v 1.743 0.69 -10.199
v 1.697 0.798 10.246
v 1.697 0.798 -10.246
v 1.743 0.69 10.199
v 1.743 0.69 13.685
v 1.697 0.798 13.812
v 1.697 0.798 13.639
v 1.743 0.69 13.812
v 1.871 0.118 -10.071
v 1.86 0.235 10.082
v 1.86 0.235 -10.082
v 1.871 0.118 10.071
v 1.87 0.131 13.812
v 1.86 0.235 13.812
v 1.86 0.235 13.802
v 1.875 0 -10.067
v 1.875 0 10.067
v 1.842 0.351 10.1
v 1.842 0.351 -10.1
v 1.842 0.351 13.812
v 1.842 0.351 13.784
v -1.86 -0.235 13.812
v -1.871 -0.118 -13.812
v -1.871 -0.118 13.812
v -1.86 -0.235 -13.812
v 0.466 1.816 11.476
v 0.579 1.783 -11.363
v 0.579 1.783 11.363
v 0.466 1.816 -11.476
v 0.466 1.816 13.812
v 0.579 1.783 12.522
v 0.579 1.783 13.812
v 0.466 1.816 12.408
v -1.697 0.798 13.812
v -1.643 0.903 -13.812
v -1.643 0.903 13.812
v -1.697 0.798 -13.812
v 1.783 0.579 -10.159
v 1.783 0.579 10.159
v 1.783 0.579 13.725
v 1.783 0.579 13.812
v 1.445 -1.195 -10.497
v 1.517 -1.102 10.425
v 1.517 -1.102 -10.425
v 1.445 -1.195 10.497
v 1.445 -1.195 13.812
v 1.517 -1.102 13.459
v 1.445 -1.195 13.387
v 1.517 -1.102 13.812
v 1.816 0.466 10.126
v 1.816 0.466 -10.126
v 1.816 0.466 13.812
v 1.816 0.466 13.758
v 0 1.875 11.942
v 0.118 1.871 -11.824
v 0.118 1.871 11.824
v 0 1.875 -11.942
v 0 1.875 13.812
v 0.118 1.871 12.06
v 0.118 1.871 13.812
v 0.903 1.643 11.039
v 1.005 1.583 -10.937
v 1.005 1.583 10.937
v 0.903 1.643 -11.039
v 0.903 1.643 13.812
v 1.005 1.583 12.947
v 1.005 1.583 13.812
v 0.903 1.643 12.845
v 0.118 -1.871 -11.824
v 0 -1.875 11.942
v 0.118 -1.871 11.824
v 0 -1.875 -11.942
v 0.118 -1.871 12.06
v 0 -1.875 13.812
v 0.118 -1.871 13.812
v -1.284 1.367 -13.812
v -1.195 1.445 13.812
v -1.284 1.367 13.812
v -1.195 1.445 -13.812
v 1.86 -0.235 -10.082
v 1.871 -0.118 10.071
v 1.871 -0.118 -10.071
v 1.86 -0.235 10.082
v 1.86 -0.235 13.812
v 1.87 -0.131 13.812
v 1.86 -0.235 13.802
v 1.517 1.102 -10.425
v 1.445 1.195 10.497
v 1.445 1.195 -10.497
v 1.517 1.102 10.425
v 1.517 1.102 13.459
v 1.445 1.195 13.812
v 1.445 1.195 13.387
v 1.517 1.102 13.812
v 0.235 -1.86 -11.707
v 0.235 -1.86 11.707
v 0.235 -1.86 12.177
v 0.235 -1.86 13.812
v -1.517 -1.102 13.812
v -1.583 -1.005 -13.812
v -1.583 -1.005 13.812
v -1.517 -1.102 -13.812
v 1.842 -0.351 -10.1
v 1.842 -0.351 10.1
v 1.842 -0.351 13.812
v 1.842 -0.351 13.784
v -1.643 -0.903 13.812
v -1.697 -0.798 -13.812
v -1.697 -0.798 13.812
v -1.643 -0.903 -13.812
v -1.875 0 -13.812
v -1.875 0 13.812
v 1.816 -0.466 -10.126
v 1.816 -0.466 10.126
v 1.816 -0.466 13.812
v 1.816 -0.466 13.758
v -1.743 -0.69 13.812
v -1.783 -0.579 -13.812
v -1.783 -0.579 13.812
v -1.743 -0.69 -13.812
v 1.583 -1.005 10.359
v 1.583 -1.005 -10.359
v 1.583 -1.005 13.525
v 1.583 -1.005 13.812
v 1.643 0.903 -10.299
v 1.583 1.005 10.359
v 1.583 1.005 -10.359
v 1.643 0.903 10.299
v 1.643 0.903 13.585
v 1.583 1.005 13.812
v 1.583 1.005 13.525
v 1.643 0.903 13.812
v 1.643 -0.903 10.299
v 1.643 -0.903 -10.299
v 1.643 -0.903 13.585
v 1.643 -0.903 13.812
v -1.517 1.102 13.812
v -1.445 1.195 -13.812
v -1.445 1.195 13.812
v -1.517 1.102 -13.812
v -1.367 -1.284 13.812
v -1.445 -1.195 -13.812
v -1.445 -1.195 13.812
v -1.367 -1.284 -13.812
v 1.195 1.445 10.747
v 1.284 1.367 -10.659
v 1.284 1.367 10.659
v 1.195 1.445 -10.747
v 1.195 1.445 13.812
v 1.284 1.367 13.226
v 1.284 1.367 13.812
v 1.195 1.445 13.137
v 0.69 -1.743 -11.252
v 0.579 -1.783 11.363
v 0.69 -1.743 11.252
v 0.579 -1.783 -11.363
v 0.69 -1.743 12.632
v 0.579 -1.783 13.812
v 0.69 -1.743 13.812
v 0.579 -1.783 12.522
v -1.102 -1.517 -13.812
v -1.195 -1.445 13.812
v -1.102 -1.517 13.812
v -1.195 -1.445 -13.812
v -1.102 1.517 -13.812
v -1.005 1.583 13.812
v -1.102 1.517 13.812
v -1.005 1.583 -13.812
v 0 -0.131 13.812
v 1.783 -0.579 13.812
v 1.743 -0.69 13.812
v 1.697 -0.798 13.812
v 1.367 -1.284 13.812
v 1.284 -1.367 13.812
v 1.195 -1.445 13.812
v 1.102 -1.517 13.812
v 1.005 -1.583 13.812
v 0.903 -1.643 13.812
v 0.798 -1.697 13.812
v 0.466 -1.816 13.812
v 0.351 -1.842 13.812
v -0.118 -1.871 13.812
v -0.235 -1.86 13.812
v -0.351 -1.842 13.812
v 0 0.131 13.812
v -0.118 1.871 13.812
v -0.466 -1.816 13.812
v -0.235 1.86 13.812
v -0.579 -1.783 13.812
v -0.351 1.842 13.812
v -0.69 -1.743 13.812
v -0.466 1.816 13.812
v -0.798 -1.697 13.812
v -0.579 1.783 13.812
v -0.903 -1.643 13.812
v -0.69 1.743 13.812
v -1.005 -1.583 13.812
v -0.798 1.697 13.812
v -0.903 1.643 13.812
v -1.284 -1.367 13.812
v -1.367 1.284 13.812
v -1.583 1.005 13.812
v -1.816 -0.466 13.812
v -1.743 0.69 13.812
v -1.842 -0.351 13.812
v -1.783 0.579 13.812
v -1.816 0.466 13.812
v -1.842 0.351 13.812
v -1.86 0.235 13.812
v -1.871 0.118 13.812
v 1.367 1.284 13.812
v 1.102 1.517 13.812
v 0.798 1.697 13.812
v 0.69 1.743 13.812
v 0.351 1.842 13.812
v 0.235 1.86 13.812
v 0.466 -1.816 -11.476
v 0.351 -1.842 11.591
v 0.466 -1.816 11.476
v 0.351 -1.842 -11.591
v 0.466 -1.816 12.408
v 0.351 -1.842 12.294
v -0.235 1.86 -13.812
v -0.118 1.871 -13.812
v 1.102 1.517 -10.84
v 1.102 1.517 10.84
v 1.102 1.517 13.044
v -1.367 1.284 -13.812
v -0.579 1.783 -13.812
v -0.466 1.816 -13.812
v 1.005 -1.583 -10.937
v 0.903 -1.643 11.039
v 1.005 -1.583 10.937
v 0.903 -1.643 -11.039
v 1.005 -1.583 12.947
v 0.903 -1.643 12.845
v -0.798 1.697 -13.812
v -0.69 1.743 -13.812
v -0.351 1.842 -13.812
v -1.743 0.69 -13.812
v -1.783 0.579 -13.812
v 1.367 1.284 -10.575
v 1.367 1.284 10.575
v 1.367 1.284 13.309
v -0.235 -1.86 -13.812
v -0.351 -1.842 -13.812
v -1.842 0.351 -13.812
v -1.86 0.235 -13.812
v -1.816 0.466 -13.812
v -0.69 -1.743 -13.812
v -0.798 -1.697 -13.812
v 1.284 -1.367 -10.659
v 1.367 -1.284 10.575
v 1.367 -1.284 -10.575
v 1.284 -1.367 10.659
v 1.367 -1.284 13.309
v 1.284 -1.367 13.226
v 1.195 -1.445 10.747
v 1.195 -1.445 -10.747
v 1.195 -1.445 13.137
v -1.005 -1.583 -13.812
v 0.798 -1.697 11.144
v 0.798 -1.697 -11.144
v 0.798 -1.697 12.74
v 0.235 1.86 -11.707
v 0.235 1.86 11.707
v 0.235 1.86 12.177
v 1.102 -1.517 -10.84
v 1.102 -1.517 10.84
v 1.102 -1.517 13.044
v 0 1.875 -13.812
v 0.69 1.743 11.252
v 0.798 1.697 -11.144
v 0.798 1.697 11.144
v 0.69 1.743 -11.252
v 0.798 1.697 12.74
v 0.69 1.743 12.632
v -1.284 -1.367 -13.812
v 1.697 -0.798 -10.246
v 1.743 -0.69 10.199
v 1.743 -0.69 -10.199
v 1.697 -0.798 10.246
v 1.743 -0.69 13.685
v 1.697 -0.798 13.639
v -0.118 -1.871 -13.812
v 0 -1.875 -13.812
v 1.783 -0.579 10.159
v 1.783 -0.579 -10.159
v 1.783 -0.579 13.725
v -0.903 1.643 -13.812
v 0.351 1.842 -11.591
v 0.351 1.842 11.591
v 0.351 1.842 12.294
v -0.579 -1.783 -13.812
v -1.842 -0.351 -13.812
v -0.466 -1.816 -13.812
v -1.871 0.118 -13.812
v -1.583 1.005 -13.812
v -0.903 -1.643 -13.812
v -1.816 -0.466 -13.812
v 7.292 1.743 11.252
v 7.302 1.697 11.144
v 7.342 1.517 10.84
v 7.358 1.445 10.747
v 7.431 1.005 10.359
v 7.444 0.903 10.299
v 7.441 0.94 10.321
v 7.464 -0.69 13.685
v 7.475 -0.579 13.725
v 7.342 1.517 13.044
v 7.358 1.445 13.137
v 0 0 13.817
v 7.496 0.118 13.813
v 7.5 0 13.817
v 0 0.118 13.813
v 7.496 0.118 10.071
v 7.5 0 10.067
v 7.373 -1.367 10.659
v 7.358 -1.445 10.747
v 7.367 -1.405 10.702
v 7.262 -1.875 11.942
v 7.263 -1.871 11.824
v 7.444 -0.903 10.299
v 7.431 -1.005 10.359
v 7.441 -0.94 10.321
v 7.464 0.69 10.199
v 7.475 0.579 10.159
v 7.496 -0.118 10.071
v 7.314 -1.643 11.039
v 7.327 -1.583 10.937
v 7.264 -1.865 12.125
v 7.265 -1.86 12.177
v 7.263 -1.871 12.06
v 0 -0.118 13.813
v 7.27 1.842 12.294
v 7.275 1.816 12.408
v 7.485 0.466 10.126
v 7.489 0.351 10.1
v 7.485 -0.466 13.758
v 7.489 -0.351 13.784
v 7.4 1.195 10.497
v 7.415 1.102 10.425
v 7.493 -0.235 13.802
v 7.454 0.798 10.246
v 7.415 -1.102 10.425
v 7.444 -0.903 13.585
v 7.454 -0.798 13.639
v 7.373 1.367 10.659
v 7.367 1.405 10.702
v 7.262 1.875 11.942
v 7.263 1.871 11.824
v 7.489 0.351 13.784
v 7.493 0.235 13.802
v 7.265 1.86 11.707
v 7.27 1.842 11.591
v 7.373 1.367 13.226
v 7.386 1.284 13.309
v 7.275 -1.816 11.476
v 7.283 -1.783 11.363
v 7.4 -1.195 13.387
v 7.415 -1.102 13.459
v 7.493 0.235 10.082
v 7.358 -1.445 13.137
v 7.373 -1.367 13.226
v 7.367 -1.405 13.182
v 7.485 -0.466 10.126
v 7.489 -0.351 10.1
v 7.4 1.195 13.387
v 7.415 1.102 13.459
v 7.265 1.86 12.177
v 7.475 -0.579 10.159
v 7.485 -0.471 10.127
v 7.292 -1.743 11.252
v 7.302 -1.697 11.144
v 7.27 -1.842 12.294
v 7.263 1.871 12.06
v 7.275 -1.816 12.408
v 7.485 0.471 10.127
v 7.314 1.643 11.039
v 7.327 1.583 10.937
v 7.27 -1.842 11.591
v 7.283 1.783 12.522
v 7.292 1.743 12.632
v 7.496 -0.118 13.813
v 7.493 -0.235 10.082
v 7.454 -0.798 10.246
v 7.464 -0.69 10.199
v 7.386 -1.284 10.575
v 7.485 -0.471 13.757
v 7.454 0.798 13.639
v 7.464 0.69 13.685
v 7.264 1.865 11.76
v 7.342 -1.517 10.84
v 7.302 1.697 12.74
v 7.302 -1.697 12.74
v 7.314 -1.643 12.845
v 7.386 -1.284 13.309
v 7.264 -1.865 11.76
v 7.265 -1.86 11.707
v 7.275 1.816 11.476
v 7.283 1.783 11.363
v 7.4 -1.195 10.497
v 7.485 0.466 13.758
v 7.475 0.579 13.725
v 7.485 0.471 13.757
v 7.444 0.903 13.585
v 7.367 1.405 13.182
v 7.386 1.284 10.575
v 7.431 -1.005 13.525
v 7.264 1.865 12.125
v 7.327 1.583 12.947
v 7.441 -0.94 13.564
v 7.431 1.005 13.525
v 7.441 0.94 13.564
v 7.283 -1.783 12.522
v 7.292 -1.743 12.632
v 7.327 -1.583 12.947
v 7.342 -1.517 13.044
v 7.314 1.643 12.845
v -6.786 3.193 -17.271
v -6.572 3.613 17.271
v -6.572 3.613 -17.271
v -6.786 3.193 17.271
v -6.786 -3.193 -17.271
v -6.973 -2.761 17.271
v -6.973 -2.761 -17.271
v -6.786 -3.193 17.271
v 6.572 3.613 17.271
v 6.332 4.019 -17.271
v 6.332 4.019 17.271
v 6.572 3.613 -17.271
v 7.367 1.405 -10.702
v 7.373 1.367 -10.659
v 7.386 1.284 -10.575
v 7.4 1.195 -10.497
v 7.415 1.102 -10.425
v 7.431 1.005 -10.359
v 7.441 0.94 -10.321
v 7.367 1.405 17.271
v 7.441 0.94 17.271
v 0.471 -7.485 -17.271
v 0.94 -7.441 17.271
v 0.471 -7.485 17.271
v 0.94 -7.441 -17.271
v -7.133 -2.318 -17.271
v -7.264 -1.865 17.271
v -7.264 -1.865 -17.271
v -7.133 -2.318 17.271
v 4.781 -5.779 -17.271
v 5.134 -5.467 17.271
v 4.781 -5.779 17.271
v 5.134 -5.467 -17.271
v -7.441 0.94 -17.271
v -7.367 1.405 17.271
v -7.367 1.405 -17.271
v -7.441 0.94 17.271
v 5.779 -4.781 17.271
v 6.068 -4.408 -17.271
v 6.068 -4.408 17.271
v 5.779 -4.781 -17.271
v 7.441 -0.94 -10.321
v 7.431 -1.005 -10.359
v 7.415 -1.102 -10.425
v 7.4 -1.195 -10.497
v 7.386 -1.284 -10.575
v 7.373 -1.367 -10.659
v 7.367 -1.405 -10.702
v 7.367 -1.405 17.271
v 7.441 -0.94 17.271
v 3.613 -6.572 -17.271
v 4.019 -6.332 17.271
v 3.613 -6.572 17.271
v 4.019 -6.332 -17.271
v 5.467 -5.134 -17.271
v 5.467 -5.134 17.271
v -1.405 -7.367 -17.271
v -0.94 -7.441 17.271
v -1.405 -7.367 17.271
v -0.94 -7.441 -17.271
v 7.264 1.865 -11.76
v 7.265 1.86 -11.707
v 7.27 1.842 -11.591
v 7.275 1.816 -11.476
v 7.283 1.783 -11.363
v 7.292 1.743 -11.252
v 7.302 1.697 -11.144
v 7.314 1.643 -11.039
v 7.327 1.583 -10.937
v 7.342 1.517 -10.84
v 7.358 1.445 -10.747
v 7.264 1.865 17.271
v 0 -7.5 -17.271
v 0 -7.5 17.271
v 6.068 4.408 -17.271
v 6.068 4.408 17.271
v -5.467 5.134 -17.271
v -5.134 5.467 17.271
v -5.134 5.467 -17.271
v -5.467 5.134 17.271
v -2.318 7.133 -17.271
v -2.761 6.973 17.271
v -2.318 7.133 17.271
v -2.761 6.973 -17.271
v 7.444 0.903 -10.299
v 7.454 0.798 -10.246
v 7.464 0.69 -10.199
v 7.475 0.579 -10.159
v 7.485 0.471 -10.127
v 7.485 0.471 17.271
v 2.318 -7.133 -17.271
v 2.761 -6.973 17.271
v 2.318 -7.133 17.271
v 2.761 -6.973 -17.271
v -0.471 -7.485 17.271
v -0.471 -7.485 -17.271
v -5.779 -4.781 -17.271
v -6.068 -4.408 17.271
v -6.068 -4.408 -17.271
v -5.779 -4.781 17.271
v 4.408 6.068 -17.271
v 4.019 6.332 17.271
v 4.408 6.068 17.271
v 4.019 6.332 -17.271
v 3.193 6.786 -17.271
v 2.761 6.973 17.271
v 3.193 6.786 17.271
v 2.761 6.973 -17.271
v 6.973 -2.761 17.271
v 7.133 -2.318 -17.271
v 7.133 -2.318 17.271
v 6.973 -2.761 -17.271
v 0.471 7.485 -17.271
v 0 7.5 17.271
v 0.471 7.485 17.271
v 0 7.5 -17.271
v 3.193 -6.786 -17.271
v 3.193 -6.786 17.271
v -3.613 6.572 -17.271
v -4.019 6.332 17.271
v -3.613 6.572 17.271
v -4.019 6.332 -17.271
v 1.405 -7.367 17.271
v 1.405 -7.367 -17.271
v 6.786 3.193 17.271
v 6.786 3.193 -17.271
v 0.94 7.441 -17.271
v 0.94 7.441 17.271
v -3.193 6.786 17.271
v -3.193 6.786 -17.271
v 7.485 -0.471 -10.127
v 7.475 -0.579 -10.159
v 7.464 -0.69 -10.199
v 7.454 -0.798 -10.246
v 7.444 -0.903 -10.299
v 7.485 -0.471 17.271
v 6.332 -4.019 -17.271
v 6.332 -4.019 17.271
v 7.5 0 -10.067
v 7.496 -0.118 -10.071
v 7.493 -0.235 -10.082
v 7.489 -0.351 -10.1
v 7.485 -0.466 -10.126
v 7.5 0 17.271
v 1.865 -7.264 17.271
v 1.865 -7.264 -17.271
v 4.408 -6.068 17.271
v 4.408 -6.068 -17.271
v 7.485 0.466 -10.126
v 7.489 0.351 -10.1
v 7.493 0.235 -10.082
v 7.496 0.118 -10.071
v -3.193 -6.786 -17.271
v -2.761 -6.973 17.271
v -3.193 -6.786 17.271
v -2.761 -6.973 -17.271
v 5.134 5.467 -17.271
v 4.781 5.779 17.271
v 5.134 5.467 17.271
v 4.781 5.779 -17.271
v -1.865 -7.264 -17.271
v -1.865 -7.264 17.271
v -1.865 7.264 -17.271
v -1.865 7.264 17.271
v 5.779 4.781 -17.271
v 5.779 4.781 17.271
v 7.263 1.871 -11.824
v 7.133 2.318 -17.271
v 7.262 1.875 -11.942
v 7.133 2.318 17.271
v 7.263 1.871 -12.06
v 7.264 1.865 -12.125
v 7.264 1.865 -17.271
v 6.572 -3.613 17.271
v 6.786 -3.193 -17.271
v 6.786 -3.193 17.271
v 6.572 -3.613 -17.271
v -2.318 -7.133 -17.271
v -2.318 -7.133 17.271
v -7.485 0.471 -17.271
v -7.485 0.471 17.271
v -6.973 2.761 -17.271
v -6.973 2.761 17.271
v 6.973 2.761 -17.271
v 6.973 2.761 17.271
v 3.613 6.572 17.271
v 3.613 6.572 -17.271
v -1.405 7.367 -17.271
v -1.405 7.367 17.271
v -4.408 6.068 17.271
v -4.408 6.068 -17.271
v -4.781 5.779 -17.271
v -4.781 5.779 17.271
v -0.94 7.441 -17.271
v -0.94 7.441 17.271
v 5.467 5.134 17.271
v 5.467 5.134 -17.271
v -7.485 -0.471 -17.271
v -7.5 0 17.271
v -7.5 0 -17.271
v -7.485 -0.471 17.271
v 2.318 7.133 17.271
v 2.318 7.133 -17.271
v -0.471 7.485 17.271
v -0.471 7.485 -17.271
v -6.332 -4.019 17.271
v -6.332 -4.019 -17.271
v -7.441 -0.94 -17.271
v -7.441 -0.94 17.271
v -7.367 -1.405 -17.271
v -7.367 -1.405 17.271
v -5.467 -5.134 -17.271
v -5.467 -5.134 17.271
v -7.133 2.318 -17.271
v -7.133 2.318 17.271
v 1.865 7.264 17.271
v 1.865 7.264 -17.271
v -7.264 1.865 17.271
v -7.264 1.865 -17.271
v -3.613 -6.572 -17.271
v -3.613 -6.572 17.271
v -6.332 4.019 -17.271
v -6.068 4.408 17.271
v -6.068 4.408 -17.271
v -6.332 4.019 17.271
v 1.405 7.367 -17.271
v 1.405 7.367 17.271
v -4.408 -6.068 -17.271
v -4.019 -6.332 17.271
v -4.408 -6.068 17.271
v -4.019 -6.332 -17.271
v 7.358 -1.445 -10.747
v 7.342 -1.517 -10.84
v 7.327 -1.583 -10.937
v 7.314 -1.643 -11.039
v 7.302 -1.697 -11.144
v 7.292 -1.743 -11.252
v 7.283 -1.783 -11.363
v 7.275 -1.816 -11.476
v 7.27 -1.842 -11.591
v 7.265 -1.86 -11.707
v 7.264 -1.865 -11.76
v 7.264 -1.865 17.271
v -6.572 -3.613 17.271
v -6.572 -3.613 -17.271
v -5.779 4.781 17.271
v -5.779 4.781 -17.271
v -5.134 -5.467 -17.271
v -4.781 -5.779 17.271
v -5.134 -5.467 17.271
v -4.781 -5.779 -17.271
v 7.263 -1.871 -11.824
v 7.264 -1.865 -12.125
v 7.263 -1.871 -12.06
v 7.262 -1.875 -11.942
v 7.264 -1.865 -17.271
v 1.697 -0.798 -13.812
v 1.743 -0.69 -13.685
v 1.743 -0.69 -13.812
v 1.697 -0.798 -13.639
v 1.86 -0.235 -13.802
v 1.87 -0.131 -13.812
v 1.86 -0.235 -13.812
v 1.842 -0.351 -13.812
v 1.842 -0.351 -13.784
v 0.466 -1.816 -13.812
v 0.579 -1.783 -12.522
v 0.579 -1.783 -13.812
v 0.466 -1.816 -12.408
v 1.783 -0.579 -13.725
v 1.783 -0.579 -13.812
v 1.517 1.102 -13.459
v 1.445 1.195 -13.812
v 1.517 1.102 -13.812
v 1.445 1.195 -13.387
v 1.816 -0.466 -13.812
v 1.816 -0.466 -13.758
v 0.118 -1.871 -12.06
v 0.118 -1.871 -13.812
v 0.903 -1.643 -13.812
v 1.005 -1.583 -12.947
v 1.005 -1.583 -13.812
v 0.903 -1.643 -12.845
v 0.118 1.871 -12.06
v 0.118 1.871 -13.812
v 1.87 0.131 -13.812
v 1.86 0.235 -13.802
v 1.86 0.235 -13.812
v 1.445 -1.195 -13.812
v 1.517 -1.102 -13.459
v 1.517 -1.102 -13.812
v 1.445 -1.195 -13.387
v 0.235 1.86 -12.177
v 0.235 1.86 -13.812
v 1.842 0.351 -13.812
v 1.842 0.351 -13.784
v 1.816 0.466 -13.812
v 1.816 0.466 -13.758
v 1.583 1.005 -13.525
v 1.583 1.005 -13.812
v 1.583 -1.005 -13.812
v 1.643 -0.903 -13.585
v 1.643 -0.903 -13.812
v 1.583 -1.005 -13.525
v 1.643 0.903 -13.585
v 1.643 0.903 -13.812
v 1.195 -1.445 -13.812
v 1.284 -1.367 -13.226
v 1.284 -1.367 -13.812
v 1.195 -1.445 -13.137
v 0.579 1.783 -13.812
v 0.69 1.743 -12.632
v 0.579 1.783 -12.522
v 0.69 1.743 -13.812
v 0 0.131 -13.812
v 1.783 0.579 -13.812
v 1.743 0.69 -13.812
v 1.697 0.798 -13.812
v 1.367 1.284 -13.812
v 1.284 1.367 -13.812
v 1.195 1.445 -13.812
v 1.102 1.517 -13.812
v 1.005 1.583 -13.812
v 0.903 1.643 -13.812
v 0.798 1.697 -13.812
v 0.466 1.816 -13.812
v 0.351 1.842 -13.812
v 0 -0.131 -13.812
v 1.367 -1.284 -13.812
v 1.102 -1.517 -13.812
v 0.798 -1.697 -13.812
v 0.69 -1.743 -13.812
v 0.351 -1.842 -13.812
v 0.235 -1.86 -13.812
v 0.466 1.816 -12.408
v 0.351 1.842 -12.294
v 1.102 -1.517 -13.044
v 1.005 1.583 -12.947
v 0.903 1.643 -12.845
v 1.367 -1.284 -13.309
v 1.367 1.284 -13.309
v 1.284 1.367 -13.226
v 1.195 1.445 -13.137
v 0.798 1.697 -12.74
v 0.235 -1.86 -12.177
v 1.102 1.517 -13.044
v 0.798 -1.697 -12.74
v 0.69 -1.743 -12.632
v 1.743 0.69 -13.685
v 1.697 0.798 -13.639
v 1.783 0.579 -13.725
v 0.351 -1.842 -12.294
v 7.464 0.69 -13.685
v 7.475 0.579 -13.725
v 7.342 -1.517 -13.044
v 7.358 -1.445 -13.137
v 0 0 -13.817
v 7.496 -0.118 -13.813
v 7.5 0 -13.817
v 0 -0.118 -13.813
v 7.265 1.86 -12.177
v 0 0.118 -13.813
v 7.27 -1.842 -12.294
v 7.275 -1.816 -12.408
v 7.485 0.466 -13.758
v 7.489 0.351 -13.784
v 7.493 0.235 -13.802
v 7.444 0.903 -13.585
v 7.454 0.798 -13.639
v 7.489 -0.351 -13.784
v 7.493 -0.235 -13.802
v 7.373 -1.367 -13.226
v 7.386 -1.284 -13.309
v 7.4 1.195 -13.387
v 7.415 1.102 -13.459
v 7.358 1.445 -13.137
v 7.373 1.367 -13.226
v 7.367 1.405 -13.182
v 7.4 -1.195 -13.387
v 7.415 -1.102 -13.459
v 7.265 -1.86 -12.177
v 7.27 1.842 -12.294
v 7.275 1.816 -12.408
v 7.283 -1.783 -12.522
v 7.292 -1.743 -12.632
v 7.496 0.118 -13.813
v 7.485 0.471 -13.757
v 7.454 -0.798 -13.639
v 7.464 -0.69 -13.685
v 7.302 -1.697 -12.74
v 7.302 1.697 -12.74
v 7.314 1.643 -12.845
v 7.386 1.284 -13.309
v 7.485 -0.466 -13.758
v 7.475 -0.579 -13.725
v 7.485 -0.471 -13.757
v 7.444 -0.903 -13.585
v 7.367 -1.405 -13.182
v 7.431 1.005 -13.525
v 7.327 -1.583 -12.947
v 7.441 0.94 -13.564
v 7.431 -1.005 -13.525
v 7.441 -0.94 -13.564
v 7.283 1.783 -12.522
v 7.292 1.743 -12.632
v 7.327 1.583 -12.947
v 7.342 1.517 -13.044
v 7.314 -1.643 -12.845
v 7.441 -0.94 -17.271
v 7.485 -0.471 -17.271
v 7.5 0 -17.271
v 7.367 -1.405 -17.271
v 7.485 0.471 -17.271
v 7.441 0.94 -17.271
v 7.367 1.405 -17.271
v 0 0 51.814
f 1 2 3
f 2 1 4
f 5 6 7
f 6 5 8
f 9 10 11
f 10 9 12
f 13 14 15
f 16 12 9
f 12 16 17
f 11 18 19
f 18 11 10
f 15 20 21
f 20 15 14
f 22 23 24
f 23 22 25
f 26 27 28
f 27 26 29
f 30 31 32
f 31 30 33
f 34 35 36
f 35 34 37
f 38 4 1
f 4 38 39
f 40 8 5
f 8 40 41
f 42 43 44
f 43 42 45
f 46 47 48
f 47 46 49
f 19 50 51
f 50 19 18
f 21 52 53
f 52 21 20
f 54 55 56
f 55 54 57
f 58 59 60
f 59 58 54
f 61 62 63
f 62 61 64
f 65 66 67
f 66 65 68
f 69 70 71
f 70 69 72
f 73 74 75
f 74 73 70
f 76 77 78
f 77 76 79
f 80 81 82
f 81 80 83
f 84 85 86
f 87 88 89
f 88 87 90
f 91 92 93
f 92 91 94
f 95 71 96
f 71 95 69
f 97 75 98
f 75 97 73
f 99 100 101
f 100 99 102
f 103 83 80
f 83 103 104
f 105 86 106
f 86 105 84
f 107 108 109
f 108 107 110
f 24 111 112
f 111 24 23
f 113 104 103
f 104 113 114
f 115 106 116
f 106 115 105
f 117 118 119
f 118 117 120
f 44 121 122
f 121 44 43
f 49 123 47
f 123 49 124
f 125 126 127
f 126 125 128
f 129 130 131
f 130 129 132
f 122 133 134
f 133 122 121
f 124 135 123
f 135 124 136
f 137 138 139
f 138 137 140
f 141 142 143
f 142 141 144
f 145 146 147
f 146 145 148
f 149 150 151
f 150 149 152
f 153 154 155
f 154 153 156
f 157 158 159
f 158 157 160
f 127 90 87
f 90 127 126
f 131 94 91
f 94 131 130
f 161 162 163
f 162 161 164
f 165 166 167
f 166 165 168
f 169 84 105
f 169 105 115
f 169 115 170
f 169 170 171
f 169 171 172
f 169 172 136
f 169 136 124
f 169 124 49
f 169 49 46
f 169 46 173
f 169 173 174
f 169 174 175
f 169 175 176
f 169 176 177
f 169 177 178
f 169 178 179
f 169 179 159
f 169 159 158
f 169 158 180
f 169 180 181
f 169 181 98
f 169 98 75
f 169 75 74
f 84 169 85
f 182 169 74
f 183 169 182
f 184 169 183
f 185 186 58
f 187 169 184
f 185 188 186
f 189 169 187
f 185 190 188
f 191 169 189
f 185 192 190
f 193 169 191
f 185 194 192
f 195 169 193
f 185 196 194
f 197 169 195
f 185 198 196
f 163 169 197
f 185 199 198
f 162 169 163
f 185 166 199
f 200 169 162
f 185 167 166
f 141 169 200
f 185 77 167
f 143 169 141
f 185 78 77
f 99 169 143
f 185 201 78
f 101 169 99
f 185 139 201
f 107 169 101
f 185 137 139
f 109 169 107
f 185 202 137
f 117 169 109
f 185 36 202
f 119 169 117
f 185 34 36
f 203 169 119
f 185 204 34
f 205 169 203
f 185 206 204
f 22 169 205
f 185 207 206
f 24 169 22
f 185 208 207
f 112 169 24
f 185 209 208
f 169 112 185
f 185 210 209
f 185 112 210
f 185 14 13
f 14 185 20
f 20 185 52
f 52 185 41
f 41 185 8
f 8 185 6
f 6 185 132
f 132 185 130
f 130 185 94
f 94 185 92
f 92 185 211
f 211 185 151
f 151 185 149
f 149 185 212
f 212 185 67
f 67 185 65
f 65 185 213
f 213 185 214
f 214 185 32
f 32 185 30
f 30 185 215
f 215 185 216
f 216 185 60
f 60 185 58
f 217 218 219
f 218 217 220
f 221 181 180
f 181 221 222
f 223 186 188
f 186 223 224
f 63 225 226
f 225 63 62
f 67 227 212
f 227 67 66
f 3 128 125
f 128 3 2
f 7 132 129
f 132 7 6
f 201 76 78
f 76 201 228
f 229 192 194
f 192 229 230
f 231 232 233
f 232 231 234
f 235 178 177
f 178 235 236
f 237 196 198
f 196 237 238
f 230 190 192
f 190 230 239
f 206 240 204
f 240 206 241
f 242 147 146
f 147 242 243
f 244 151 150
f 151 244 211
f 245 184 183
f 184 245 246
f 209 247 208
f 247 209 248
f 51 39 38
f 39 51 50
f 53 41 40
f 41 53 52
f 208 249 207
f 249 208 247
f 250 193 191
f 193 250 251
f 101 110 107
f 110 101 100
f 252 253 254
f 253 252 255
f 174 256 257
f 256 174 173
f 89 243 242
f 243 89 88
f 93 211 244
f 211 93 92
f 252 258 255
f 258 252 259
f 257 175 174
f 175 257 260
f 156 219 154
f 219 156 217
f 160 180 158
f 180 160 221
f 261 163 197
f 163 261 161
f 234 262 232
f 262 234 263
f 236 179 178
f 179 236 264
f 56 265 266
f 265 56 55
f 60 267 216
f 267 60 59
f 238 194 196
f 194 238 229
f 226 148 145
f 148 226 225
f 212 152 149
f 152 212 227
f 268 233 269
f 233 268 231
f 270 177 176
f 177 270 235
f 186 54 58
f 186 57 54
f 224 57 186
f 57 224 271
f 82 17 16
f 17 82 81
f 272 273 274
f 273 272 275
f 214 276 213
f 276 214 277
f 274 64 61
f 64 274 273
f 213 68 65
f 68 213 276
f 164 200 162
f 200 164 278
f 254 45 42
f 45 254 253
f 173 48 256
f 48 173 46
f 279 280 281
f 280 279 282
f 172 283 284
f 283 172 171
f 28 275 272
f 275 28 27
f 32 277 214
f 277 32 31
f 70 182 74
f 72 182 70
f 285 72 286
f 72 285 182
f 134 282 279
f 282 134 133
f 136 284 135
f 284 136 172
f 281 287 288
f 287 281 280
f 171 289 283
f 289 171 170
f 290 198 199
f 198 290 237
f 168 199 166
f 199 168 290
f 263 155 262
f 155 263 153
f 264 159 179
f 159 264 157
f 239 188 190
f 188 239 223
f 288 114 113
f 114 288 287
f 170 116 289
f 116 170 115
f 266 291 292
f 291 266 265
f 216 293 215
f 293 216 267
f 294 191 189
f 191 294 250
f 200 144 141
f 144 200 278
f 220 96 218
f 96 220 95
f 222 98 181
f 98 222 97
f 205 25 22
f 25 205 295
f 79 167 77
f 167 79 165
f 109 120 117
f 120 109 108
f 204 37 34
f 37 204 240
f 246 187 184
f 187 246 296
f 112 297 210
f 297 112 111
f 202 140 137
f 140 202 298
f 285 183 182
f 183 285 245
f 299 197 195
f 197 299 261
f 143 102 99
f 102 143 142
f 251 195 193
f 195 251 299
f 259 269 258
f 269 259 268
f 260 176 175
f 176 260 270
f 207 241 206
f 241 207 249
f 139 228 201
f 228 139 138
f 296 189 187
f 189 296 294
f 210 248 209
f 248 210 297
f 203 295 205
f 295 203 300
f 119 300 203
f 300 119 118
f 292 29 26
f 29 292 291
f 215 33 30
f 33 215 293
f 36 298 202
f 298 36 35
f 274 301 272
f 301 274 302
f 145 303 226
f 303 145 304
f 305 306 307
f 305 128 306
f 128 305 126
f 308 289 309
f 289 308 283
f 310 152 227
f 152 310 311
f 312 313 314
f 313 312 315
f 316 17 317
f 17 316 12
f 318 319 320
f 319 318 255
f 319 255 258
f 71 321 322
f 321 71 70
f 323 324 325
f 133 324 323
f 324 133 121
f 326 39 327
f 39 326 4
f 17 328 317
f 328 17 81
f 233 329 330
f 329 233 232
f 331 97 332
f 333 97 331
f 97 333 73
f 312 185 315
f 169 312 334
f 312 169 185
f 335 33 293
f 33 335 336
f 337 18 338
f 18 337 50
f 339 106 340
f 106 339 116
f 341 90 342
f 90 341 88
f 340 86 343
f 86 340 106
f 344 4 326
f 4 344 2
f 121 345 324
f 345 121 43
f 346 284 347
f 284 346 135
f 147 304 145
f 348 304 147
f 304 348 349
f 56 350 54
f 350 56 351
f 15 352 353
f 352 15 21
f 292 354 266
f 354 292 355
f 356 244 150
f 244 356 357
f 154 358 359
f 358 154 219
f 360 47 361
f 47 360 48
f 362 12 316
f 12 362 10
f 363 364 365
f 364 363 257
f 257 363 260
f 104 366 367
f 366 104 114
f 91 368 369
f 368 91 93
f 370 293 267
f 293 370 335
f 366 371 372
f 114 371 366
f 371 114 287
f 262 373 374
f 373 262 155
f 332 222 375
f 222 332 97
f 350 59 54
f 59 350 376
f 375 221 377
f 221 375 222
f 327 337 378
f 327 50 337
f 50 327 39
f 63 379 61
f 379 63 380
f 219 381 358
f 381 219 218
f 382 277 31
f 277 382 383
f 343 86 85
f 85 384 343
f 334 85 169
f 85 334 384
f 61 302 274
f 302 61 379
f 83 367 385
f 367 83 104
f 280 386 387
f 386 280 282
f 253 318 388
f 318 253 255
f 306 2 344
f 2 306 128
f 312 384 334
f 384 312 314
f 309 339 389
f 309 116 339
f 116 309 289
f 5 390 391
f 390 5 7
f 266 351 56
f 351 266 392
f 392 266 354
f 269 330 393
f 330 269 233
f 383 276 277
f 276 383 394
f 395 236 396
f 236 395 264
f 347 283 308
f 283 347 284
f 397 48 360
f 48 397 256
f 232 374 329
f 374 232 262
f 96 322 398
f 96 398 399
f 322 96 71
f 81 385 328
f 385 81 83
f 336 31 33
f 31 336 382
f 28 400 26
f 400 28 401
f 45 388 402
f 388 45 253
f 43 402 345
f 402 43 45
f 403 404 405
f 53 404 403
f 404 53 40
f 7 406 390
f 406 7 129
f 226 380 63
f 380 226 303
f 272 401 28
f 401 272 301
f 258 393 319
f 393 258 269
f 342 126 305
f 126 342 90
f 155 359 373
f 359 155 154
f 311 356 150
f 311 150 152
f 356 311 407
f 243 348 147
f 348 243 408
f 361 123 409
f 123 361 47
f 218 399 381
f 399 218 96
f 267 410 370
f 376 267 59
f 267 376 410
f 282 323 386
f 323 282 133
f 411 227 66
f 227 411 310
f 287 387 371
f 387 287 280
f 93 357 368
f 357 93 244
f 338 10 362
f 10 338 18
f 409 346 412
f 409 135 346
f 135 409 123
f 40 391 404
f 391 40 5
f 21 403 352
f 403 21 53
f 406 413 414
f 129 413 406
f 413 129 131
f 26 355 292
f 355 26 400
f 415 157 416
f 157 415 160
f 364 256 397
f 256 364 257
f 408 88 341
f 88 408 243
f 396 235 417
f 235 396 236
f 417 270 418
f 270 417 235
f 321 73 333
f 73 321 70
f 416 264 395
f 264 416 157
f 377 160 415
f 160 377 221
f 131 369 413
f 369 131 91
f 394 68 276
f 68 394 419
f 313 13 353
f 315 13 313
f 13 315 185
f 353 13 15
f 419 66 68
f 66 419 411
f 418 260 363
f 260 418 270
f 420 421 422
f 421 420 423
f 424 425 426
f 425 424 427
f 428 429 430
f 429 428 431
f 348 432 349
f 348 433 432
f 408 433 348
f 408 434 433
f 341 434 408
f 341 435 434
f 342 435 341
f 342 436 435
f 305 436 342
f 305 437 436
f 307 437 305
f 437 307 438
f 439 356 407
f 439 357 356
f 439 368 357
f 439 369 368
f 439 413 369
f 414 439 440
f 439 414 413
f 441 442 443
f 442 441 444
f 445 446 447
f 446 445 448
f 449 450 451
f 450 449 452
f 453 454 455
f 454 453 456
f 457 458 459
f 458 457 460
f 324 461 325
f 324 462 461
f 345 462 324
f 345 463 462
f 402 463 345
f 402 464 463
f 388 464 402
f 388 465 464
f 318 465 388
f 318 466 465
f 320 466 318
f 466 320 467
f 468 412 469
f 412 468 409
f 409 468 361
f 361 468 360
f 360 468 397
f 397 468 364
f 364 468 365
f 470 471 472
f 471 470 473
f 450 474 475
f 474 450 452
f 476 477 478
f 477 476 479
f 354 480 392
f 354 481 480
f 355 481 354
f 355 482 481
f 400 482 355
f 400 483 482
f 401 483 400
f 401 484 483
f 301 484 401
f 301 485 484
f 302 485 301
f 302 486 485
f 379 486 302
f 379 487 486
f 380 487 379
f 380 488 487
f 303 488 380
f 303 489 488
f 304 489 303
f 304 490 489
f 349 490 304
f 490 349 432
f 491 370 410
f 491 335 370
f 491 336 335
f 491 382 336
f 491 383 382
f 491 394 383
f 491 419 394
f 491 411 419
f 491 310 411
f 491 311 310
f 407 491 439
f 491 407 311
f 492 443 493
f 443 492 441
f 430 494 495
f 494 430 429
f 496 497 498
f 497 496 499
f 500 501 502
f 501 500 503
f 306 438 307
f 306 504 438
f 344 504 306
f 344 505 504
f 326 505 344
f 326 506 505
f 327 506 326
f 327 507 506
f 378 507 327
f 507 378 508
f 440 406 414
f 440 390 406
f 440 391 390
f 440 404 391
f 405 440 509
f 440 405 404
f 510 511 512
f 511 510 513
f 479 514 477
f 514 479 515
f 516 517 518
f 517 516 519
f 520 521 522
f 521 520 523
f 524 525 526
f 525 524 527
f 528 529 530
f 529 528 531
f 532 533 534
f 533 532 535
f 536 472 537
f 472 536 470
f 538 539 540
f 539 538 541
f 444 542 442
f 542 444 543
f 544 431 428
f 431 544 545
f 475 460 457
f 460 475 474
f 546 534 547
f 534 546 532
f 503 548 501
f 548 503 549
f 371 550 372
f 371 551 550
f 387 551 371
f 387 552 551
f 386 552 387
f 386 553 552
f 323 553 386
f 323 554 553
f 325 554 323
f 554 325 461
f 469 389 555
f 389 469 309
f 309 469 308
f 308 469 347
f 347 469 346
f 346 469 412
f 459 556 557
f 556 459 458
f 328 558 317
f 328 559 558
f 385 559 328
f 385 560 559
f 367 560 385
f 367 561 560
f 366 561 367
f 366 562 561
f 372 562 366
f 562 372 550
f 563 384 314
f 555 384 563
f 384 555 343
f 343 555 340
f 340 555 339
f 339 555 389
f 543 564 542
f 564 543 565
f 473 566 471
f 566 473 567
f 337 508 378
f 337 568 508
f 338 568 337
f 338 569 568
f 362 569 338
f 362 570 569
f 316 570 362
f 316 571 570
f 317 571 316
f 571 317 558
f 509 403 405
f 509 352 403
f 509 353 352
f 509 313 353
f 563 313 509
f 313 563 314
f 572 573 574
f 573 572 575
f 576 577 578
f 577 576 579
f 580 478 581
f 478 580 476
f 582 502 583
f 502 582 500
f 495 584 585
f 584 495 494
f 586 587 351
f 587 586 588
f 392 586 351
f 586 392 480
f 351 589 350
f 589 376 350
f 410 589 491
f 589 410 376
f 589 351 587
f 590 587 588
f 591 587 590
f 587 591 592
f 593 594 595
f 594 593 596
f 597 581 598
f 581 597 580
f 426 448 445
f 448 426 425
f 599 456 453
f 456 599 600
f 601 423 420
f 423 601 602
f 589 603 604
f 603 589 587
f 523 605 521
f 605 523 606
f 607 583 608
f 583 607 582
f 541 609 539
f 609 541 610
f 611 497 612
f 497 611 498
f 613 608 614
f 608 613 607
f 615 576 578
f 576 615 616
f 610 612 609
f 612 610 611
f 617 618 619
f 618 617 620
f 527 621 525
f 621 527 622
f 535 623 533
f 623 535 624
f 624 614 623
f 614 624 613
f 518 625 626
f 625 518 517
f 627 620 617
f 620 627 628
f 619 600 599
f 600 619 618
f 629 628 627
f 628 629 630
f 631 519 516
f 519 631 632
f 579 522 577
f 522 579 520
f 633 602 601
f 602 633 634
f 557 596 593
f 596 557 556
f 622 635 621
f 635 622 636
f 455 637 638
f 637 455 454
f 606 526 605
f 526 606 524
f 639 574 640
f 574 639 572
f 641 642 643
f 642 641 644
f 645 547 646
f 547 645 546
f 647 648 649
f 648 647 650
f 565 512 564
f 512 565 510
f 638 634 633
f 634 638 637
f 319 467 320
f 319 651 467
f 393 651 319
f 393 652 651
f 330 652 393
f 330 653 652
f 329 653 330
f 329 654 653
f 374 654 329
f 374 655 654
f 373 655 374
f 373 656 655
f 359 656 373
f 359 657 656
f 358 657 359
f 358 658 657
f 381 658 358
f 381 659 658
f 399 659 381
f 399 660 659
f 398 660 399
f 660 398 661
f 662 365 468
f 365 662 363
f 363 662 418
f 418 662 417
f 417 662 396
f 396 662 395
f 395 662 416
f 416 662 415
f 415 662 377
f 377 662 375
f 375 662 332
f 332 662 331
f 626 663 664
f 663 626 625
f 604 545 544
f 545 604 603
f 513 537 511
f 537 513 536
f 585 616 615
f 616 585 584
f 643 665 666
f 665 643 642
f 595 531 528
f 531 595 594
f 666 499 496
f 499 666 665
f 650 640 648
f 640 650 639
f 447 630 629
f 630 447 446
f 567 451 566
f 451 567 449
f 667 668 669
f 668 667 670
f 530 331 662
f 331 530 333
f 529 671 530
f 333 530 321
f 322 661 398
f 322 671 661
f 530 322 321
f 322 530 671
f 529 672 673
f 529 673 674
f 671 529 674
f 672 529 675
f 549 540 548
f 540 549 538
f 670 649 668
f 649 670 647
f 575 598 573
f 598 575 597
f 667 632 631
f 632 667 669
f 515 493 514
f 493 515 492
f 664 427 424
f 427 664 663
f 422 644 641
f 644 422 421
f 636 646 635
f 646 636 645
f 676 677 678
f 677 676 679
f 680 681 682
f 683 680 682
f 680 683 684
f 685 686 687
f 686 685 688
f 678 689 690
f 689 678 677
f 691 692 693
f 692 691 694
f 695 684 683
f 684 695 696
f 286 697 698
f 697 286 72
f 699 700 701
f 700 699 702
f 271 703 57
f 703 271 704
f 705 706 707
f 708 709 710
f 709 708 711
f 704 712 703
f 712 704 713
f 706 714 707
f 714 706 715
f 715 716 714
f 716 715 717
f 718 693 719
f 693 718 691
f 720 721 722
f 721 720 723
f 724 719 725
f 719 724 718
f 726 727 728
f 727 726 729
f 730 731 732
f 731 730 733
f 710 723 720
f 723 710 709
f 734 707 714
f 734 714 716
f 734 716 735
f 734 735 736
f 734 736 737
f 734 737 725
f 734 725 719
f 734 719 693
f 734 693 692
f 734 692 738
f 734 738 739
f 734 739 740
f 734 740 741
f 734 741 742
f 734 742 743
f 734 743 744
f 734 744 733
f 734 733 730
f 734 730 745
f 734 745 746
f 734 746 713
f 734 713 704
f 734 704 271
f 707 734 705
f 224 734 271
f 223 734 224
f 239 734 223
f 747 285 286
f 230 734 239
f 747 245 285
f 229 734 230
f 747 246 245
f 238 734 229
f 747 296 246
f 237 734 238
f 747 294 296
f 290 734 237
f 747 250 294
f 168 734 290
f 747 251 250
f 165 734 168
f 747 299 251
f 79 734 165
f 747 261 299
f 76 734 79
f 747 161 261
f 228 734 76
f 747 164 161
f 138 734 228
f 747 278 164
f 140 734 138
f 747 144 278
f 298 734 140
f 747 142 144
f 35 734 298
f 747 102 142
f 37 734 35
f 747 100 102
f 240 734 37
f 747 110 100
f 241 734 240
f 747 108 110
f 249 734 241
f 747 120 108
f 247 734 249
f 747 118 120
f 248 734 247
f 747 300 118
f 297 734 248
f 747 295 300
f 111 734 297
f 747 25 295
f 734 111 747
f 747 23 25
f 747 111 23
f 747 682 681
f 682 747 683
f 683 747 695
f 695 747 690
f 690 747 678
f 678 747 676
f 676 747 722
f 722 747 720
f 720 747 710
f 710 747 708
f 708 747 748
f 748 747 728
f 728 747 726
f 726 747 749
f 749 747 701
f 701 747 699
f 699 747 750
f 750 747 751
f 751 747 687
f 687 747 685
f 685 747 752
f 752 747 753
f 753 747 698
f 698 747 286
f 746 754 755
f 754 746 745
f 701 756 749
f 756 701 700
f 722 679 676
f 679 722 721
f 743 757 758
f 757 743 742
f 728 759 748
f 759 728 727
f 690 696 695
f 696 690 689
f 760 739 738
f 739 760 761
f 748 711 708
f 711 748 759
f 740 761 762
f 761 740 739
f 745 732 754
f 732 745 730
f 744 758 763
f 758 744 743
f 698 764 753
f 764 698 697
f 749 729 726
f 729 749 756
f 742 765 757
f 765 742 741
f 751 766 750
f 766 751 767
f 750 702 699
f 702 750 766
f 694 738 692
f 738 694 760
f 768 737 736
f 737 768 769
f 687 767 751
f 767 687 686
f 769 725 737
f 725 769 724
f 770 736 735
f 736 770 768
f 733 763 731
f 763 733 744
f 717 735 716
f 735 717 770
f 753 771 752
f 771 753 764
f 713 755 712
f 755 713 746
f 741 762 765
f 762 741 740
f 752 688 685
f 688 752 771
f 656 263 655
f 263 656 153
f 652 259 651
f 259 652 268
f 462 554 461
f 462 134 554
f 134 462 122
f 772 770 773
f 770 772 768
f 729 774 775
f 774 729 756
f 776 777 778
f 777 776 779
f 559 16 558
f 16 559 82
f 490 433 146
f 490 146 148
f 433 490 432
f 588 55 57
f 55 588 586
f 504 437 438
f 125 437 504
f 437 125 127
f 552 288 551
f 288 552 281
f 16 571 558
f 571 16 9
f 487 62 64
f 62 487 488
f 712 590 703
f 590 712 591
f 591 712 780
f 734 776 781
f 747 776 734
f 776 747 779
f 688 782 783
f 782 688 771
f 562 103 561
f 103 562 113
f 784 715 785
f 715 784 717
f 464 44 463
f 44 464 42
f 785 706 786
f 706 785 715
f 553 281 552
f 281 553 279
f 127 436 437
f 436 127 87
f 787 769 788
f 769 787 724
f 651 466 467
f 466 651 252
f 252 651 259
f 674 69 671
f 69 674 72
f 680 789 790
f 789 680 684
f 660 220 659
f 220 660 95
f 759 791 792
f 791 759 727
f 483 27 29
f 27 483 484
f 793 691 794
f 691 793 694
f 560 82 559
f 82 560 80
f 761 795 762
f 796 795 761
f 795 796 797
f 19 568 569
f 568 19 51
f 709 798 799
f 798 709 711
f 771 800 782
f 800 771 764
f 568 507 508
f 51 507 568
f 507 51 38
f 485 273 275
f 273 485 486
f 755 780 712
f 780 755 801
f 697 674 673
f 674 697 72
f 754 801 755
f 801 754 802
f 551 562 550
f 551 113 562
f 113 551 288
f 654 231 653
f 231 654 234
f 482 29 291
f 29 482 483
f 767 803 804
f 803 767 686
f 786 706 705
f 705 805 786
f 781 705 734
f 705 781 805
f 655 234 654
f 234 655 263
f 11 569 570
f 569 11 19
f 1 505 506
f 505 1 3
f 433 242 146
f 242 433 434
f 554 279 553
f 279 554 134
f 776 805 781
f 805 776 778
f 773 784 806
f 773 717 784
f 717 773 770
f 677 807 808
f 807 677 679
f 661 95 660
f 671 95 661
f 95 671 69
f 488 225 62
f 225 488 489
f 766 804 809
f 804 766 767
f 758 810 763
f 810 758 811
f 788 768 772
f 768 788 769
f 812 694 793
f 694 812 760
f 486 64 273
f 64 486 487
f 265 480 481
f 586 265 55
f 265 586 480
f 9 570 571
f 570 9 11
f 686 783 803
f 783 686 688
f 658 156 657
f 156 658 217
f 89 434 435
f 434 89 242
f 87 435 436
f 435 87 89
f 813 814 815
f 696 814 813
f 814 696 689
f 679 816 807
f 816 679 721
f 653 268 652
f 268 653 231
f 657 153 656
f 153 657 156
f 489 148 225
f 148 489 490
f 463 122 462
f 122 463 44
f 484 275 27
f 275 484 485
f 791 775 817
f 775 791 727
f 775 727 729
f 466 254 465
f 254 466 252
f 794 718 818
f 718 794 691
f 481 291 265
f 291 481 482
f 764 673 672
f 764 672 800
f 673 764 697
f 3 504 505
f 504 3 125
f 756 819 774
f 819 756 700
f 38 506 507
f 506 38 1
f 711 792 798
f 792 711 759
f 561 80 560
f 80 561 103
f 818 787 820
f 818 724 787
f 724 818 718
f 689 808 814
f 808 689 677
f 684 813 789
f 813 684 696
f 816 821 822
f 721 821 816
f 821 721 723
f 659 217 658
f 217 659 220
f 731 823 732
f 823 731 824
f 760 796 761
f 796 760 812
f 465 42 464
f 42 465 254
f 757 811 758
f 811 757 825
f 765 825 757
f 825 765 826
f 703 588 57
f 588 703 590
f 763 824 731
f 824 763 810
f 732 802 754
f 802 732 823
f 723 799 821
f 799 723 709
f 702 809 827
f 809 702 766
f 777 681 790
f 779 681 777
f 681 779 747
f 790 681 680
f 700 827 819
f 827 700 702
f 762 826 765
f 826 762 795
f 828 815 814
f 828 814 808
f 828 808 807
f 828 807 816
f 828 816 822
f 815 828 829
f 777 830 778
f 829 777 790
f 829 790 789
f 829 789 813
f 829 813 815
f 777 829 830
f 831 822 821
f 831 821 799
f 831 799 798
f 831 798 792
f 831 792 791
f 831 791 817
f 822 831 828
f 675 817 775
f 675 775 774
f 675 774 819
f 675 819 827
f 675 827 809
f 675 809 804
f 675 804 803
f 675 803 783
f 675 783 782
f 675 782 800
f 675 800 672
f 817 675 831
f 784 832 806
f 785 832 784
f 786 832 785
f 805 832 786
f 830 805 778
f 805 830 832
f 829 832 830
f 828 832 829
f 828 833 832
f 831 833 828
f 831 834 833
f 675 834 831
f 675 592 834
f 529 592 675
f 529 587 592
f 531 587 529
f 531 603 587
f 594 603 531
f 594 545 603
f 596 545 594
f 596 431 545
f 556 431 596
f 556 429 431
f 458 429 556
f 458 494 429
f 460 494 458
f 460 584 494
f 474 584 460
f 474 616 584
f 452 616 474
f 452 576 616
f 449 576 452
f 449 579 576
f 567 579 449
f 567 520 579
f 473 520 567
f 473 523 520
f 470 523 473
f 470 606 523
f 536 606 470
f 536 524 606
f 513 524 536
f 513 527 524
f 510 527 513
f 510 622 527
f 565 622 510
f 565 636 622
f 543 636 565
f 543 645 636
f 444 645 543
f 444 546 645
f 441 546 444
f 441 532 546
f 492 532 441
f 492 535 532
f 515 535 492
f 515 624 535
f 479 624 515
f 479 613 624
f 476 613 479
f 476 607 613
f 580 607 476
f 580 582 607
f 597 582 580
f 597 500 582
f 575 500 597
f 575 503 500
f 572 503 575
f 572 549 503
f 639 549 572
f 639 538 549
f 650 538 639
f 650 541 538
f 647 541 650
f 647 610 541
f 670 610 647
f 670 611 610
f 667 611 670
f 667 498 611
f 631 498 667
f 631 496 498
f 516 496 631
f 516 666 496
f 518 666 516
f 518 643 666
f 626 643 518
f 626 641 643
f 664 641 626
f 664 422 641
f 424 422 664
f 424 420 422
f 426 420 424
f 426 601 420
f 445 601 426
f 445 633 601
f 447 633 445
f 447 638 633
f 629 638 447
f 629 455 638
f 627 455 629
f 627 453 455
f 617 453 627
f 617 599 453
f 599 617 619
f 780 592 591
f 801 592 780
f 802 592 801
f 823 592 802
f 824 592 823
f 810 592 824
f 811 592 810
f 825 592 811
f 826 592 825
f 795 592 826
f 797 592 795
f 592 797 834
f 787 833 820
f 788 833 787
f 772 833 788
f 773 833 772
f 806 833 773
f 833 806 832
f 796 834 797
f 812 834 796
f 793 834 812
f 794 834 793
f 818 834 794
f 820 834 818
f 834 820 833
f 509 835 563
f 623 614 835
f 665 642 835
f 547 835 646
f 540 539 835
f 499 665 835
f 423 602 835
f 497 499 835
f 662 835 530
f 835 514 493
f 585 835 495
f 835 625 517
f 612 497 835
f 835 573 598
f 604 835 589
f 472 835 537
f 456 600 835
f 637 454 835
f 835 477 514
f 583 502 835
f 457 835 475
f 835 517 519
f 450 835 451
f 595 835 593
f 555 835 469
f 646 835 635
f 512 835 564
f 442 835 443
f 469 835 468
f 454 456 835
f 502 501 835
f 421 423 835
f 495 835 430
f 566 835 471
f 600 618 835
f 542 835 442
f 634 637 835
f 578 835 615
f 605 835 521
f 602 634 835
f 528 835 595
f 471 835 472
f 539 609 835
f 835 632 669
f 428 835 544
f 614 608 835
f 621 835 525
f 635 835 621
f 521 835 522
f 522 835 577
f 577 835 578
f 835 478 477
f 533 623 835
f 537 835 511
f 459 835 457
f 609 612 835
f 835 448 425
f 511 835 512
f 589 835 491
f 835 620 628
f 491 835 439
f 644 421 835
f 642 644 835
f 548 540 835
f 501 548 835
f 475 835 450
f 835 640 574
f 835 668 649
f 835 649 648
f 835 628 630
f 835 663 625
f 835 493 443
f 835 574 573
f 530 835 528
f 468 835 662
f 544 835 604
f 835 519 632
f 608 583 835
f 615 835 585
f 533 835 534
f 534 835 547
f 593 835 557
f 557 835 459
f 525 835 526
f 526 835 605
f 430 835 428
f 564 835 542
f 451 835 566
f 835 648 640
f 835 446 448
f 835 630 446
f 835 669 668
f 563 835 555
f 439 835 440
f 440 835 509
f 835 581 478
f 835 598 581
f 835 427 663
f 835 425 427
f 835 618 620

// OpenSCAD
resolution=100;

shape_tube_d=30;

puncture_tube_d=shape_tube_d/2;
puncture_tube_r=puncture_tube_d/2;
puncture_tube_h=puncture_tube_r/tan(12.25);

venturi_r=puncture_tube_r/4;
venturi_h=puncture_tube_h/2.5;

tube_tube_r=puncture_tube_r;
tube_tube_h=puncture_tube_h/2;

echo (puncture_tube_r, puncture_tube_h);

//S=o/h
//c=a/h
//t=o/a
//a=o/t

difference() {
//	cylinder(r=2*puncture_tube_r, h=2*puncture_tube_h, $fn=resolution);

	union(){
		translate([0,0,tube_tube_h])
			cylinder(r2=0, r1=puncture_tube_r, h=puncture_tube_h, $fn=resolution);
			difference() {
				cylinder(r=tube_tube_r, h=tube_tube_h, $fn=resolution);
				union(){
					translate([0,0,-0.005])
						cylinder(r=venturi_r, h=venturi_h, $fn=resolution);
					translate([0,0,venturi_h-venturi_r])
						rotate([0,90,0])
							cylinder(r=venturi_r, h=venturi_h, $fn=resolution);
				}
			}
				
			 rotate([0,180,180])
			difference()  {
				cylinder(r=tube_tube_r, h=tube_tube_h, $fn=resolution);
				union(){
					translate([0,0,-0.005])
						cylinder(r=venturi_r, h=venturi_h, $fn=resolution);
					translate([0,0,venturi_h-venturi_r])
						rotate([0,90,0])
							cylinder(r=venturi_r, h=venturi_h, $fn=resolution);
				}
			}
		
	}	// end difference union
}	// end outer difference
